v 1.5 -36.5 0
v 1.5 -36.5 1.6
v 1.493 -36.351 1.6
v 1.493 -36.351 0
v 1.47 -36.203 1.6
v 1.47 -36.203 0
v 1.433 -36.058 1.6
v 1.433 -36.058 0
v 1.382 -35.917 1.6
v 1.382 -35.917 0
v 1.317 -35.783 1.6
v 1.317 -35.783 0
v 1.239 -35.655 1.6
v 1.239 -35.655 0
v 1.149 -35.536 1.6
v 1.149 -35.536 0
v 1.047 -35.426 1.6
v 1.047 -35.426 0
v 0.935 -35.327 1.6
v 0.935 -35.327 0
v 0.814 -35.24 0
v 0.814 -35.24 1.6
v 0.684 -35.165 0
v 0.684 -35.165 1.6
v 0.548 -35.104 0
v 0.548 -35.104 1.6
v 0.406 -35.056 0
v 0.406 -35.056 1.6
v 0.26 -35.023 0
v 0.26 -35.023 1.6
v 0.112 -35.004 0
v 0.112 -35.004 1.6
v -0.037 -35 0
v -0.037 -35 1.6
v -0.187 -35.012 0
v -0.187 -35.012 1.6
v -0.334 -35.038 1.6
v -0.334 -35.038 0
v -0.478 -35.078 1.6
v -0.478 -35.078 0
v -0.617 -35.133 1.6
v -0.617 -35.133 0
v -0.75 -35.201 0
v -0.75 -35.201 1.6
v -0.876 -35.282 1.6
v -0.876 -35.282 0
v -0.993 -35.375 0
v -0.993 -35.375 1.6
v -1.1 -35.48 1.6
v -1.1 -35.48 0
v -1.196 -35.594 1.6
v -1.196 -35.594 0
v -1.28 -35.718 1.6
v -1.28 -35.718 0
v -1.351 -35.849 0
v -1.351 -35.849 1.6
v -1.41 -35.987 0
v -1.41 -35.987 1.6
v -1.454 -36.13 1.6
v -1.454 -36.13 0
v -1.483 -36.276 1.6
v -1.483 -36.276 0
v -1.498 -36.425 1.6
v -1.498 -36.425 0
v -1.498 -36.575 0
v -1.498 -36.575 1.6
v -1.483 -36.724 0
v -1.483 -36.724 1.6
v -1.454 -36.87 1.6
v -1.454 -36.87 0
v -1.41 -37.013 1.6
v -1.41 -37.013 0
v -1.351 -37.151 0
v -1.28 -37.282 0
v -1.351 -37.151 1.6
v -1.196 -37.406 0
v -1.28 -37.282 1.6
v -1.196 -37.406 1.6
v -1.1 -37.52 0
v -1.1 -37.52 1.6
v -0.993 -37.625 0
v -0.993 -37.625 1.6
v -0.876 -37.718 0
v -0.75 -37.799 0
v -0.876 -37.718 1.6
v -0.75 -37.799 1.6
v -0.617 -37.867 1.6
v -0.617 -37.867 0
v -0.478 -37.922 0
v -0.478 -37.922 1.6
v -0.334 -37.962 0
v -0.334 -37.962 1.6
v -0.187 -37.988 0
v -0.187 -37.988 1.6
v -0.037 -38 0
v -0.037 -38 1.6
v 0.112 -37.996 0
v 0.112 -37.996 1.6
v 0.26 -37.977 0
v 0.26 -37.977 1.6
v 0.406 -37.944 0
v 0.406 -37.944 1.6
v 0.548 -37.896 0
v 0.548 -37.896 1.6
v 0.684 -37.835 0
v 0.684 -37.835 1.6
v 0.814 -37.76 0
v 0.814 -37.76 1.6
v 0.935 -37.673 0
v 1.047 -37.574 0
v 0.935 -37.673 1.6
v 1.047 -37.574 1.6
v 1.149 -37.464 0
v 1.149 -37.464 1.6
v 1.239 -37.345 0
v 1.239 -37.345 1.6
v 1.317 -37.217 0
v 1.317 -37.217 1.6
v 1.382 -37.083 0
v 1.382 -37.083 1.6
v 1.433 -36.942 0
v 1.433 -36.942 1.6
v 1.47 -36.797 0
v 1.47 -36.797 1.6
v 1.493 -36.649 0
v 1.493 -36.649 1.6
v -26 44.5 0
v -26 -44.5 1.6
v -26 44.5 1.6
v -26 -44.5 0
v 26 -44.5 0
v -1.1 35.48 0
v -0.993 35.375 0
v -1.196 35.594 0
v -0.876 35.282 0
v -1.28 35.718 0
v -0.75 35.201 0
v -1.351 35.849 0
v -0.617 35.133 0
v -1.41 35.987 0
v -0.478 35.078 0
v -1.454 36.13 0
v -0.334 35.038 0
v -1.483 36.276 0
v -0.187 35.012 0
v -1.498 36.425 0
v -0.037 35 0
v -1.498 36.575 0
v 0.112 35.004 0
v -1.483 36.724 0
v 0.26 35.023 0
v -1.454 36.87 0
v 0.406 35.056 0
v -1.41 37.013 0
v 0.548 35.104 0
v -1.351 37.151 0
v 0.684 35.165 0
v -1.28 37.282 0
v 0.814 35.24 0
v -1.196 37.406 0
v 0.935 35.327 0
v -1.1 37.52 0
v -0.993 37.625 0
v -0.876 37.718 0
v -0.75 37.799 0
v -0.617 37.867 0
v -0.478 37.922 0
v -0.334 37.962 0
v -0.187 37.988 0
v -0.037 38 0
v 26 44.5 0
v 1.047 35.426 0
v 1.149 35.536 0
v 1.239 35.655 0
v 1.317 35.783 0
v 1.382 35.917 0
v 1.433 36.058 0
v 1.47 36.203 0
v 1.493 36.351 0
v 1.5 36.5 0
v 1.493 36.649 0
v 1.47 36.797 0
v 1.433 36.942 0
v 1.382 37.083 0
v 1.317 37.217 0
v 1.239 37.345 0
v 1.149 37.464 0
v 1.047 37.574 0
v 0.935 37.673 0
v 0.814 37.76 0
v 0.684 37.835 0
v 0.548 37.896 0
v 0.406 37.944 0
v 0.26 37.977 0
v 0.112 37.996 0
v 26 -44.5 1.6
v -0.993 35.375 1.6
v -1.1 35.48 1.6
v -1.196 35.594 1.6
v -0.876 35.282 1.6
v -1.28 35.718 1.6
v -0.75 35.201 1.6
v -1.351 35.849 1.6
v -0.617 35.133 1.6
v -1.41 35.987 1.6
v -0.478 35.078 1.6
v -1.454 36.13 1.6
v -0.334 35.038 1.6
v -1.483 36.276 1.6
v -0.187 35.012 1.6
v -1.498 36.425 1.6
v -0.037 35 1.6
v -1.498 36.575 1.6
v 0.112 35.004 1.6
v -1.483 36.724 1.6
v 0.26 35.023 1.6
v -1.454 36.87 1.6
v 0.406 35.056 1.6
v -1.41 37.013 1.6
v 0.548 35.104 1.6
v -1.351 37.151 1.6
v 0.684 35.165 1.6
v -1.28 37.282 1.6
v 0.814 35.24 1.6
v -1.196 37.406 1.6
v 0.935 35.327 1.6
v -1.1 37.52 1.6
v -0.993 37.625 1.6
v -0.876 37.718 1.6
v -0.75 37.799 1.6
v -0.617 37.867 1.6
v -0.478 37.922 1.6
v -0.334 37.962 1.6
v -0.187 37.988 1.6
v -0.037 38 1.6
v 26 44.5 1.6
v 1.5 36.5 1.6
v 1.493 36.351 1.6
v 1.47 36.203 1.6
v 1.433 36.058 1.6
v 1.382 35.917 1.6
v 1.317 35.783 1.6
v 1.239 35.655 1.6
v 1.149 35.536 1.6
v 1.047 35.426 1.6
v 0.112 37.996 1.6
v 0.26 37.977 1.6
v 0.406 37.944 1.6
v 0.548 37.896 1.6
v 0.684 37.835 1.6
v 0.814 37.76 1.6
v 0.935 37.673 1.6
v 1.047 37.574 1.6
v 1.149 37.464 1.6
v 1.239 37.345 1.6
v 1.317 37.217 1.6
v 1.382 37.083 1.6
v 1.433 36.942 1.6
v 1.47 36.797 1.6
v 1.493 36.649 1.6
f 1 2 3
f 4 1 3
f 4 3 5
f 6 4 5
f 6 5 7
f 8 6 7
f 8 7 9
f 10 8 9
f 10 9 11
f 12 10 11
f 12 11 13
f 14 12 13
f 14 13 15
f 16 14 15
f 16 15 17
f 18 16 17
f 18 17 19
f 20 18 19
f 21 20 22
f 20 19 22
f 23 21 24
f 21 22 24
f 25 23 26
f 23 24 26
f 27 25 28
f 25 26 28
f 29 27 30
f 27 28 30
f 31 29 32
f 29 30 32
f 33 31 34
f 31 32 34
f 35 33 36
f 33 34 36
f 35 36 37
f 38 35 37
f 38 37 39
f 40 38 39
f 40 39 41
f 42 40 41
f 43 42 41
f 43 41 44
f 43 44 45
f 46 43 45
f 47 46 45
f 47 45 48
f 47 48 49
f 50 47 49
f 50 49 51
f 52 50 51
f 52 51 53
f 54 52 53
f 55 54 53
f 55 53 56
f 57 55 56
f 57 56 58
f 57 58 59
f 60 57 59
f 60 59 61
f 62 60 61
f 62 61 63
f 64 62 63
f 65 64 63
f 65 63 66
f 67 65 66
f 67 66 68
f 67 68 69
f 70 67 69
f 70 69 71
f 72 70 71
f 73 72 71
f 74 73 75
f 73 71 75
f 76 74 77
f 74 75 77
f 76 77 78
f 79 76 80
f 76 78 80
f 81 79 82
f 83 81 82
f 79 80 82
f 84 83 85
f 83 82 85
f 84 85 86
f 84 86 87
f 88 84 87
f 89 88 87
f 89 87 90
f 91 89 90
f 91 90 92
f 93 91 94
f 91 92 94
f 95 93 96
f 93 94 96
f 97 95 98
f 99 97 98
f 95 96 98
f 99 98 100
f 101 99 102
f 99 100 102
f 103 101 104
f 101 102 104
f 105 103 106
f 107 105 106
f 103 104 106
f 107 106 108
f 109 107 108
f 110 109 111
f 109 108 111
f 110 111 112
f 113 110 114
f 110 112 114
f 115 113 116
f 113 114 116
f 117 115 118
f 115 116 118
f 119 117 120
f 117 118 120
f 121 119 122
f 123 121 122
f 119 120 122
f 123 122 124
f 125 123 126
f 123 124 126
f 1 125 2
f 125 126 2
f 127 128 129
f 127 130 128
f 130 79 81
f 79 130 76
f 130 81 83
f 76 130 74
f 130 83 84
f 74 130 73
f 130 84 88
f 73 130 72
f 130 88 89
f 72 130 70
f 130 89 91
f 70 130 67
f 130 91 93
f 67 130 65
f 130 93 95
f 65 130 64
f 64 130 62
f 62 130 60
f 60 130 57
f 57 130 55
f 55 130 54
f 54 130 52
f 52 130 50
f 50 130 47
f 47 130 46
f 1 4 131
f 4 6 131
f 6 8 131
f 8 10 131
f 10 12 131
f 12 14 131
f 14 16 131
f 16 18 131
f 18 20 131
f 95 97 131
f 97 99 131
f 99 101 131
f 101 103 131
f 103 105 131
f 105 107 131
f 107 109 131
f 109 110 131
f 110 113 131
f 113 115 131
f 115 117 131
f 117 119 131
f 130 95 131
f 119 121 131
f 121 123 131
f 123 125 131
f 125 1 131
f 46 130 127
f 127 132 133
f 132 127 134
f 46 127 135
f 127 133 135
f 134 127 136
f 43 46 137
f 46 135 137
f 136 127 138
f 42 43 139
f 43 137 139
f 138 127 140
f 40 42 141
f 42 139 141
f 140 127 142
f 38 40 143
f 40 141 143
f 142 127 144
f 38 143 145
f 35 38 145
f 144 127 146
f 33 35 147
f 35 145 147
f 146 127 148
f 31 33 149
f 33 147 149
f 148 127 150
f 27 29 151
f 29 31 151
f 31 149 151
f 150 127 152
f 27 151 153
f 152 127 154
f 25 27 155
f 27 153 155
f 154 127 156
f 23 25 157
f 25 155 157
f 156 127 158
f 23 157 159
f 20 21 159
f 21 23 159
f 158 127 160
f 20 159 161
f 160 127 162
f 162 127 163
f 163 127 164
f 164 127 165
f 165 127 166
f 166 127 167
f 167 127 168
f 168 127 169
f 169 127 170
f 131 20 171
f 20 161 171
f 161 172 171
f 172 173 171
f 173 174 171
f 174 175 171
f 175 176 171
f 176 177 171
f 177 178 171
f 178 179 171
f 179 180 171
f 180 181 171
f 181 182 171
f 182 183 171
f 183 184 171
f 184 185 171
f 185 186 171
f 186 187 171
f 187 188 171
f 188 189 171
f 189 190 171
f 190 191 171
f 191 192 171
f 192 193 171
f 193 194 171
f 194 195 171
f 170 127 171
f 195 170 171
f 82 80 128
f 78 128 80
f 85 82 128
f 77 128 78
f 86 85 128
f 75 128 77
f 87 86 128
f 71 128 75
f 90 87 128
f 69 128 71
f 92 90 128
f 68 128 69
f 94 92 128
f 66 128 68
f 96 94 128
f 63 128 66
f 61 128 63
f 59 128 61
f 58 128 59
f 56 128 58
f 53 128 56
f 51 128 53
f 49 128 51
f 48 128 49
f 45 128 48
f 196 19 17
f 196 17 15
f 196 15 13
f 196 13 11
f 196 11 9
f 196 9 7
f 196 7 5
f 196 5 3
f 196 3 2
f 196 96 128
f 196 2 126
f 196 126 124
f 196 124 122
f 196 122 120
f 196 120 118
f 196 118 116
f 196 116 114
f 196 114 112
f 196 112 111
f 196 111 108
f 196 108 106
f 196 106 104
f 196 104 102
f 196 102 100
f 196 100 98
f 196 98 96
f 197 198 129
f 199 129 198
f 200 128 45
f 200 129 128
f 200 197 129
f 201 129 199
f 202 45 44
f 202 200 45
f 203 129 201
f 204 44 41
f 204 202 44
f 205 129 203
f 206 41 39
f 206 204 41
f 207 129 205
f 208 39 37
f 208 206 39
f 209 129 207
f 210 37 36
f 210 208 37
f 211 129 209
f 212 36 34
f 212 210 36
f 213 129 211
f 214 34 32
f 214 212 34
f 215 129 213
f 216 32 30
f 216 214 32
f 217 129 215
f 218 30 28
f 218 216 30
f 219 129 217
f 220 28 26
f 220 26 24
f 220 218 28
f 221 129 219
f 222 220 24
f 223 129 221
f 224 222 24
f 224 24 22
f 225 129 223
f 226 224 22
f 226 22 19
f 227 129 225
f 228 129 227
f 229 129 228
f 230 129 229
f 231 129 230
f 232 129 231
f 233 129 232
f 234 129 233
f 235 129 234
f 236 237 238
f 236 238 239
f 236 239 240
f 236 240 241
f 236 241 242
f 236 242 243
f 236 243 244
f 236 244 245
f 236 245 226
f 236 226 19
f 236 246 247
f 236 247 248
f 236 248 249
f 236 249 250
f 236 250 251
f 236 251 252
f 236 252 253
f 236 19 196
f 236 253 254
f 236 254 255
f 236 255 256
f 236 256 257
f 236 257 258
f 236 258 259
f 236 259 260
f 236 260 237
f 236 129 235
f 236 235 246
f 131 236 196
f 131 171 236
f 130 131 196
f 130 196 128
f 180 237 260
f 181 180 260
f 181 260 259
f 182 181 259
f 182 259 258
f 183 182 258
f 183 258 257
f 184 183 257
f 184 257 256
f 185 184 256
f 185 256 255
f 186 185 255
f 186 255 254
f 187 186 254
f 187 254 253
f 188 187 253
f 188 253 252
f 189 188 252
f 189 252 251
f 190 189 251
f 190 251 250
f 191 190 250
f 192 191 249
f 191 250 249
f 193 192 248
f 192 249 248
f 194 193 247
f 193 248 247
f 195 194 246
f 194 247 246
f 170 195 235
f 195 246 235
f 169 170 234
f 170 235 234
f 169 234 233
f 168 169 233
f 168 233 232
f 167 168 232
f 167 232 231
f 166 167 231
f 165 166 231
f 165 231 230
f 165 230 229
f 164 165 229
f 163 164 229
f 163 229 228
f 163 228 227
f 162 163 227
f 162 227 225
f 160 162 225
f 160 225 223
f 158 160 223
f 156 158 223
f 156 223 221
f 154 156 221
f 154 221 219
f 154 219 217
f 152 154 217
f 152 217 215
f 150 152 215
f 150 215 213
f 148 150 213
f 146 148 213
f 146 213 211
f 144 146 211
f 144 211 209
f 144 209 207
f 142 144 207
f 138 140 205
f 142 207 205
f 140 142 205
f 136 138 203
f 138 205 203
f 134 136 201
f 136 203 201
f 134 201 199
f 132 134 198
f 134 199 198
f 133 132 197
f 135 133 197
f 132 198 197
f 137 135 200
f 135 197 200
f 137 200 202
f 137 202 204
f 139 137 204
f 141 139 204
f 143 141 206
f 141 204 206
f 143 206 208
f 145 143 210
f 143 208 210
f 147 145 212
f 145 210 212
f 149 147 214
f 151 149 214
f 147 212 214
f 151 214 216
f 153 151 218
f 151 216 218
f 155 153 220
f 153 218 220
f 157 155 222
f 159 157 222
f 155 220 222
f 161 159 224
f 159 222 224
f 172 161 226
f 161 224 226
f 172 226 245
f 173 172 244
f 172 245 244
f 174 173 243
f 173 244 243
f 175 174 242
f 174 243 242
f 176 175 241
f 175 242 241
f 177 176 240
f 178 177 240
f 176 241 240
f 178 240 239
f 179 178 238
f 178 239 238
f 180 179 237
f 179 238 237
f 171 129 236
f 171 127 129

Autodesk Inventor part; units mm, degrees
ref_plane "YZ Plane" through (0, 0, 0) normal (1, 0, 0) x (0, 1, 0)
ref_plane "XZ Plane" through (0, 0, 0) normal (0, 1, 0) x (-1, 0, 0)
ref_plane "XY Plane" through (0, 0, 0) normal (0, 0, 1) x (1, 0, 0)
sketch "스케치1" plane through (0, 0, 0) normal (0, 0, 1) x (1, 0, 0)
  point P0 (0, 0)
sketch "스케치2" plane through (0, 0, 0) normal (0, 0, 1) x (1, 0, 0)
  line L0 (-26, 44.5) -> (26, 44.5)
  line L1 (26, 44.5) -> (26, -44.5)
  line L2 (26, -44.5) -> (-26, -44.5)
  line L3 (-26, -44.5) -> (-26, 44.5)
  line L4 (-26, 44.5) -> (26, -44.5) construction
  line L5 (26, 44.5) -> (-26, -44.5) construction
  point P0 (0, 0)
  dimension "d0" = 52
  dimension "d1" = 89
extrude "돌출1" add sketch "스케치2" along normal blind 1.6
sketch "스케치3" plane through (0, 0, 1.6) normal (0, 0, 1) x (1, 0, 0)
  circle A0 centre (0, 36.5) radius 1.5
  line L0 (26, 44.5) -> (-26, 44.5) projected
  circle A1 centre (0, -36.5) radius 1.5
  line L1 (-26, -44.5) -> (26, -44.5) projected
  line L2 (0, -62.3) -> (0, 62.3) projected
  point P0 (0, 0)
  dimension "d4" = 3
  dimension "d5" = 8
  dimension "d6" = 3
  dimension "d7" = 8
extrude "돌출2" cut sketch "스케치3" against normal up to surface (1.6 mm away)
properties part number "빵판"
